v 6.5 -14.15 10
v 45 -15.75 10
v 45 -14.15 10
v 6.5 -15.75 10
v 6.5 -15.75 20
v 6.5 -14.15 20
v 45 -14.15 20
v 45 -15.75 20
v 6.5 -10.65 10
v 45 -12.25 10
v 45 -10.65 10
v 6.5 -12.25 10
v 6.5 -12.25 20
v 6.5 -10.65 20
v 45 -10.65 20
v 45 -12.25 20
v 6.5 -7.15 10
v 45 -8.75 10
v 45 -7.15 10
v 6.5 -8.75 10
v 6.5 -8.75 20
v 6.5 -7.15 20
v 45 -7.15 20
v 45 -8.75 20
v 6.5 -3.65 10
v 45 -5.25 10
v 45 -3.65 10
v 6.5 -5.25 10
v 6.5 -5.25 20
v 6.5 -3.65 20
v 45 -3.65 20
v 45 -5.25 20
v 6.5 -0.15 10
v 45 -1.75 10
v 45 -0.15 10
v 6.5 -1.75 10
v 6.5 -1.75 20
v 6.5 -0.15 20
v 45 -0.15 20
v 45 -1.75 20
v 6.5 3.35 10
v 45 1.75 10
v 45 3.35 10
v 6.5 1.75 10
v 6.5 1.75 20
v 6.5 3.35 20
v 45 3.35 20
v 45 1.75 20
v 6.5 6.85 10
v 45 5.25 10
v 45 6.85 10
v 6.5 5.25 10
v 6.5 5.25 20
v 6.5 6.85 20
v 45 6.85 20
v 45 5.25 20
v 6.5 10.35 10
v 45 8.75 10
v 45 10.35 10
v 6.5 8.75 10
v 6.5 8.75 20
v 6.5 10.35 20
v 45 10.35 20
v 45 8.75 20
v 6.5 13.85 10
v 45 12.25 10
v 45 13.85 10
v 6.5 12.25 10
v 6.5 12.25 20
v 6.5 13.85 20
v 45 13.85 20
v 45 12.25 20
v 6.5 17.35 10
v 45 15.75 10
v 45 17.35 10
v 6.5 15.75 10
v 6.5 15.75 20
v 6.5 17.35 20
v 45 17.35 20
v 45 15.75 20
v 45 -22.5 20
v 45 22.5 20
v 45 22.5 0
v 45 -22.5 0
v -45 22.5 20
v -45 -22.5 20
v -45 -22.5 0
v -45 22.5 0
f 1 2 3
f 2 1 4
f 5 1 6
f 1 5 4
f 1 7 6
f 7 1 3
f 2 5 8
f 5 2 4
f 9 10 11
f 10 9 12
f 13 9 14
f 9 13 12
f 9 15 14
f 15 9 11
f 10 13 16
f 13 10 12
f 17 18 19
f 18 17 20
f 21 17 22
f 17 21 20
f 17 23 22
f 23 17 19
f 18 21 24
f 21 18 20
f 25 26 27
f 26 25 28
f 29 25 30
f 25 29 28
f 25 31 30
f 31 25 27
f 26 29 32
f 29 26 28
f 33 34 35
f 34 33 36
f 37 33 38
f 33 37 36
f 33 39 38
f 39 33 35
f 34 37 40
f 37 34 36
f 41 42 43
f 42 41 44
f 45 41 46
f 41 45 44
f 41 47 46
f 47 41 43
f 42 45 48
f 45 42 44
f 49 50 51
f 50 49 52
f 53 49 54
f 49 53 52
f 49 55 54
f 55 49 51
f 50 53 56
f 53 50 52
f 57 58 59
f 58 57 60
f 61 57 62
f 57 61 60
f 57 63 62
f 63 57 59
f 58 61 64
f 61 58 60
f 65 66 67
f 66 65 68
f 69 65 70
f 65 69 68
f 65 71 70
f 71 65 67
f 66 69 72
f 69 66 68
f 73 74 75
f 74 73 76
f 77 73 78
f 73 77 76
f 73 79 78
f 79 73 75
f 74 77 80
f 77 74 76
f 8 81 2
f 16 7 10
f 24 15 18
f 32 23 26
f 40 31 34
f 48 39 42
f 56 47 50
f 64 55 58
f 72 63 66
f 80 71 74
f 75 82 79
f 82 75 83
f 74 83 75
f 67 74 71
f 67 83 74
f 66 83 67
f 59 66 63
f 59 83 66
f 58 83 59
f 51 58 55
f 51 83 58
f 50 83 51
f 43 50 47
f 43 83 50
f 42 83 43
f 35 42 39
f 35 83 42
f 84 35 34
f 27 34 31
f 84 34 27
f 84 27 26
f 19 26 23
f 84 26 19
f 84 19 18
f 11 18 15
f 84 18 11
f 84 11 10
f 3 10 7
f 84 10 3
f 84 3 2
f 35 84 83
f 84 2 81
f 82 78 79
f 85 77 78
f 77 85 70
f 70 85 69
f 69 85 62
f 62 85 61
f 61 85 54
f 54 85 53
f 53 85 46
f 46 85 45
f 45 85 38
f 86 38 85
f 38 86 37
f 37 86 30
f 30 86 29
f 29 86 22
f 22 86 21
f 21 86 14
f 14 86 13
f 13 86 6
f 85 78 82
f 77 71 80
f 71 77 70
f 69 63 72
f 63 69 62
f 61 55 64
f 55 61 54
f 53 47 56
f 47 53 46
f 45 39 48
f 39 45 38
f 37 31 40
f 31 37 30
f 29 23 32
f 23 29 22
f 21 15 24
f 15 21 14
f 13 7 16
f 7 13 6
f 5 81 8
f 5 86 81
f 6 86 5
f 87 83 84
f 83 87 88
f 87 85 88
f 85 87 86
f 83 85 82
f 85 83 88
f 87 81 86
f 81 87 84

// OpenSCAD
// Slide drying rack - holds 10 microscope slides standing on their long edge
// Print orientation: base block on the bed (z = 0), slots open upward.

// ---------------- Parameters ----------------
n_slots      = 10;    // number of slide slots
slide_len    = 75;    // slide length along X (mm)
slide_wid    = 25;    // slide width along Y (mm)
slide_thk    = 1;     // slide thickness along Z (mm)

base_len     = 90;    // base block length along X (mm)
base_wid     = 45;    // base block width along Y (mm)
base_ht      = 20;    // base block height along Z (mm)

slot_len     = 77;    // slot length along X (mm)
slot_wid     = 1.6;   // slot width along Y (mm)
slot_depth   = 10;    // slot depth from top face (mm)
slot_pitch   = 3.5;   // centre-to-centre slot spacing along Y (mm)

eps          = 0.5;   // overcut past faces to avoid coplanar surfaces (mm)

$fn = 64;

// ---------------- Derived ----------------
slot_x0 = -(slot_len - base_len) / 2;              // slot start X
slot_y0 = -(n_slots - 1) * slot_pitch / 2;          // first slot centre Y

// ---------------- Model ----------------
difference() {
    // Base block, centred in X and Y, sitting on z = 0
    translate([-base_len / 2, -base_wid / 2, 0])
        cube([base_len, base_wid, base_ht]);

    // Parallel slots running along X, open at the top
    for (i = [0 : n_slots - 1])
        translate([slot_x0, slot_y0 + i * slot_pitch, base_ht - slot_depth])
            cube([slot_len, slot_wid, slot_depth + eps]);
}
